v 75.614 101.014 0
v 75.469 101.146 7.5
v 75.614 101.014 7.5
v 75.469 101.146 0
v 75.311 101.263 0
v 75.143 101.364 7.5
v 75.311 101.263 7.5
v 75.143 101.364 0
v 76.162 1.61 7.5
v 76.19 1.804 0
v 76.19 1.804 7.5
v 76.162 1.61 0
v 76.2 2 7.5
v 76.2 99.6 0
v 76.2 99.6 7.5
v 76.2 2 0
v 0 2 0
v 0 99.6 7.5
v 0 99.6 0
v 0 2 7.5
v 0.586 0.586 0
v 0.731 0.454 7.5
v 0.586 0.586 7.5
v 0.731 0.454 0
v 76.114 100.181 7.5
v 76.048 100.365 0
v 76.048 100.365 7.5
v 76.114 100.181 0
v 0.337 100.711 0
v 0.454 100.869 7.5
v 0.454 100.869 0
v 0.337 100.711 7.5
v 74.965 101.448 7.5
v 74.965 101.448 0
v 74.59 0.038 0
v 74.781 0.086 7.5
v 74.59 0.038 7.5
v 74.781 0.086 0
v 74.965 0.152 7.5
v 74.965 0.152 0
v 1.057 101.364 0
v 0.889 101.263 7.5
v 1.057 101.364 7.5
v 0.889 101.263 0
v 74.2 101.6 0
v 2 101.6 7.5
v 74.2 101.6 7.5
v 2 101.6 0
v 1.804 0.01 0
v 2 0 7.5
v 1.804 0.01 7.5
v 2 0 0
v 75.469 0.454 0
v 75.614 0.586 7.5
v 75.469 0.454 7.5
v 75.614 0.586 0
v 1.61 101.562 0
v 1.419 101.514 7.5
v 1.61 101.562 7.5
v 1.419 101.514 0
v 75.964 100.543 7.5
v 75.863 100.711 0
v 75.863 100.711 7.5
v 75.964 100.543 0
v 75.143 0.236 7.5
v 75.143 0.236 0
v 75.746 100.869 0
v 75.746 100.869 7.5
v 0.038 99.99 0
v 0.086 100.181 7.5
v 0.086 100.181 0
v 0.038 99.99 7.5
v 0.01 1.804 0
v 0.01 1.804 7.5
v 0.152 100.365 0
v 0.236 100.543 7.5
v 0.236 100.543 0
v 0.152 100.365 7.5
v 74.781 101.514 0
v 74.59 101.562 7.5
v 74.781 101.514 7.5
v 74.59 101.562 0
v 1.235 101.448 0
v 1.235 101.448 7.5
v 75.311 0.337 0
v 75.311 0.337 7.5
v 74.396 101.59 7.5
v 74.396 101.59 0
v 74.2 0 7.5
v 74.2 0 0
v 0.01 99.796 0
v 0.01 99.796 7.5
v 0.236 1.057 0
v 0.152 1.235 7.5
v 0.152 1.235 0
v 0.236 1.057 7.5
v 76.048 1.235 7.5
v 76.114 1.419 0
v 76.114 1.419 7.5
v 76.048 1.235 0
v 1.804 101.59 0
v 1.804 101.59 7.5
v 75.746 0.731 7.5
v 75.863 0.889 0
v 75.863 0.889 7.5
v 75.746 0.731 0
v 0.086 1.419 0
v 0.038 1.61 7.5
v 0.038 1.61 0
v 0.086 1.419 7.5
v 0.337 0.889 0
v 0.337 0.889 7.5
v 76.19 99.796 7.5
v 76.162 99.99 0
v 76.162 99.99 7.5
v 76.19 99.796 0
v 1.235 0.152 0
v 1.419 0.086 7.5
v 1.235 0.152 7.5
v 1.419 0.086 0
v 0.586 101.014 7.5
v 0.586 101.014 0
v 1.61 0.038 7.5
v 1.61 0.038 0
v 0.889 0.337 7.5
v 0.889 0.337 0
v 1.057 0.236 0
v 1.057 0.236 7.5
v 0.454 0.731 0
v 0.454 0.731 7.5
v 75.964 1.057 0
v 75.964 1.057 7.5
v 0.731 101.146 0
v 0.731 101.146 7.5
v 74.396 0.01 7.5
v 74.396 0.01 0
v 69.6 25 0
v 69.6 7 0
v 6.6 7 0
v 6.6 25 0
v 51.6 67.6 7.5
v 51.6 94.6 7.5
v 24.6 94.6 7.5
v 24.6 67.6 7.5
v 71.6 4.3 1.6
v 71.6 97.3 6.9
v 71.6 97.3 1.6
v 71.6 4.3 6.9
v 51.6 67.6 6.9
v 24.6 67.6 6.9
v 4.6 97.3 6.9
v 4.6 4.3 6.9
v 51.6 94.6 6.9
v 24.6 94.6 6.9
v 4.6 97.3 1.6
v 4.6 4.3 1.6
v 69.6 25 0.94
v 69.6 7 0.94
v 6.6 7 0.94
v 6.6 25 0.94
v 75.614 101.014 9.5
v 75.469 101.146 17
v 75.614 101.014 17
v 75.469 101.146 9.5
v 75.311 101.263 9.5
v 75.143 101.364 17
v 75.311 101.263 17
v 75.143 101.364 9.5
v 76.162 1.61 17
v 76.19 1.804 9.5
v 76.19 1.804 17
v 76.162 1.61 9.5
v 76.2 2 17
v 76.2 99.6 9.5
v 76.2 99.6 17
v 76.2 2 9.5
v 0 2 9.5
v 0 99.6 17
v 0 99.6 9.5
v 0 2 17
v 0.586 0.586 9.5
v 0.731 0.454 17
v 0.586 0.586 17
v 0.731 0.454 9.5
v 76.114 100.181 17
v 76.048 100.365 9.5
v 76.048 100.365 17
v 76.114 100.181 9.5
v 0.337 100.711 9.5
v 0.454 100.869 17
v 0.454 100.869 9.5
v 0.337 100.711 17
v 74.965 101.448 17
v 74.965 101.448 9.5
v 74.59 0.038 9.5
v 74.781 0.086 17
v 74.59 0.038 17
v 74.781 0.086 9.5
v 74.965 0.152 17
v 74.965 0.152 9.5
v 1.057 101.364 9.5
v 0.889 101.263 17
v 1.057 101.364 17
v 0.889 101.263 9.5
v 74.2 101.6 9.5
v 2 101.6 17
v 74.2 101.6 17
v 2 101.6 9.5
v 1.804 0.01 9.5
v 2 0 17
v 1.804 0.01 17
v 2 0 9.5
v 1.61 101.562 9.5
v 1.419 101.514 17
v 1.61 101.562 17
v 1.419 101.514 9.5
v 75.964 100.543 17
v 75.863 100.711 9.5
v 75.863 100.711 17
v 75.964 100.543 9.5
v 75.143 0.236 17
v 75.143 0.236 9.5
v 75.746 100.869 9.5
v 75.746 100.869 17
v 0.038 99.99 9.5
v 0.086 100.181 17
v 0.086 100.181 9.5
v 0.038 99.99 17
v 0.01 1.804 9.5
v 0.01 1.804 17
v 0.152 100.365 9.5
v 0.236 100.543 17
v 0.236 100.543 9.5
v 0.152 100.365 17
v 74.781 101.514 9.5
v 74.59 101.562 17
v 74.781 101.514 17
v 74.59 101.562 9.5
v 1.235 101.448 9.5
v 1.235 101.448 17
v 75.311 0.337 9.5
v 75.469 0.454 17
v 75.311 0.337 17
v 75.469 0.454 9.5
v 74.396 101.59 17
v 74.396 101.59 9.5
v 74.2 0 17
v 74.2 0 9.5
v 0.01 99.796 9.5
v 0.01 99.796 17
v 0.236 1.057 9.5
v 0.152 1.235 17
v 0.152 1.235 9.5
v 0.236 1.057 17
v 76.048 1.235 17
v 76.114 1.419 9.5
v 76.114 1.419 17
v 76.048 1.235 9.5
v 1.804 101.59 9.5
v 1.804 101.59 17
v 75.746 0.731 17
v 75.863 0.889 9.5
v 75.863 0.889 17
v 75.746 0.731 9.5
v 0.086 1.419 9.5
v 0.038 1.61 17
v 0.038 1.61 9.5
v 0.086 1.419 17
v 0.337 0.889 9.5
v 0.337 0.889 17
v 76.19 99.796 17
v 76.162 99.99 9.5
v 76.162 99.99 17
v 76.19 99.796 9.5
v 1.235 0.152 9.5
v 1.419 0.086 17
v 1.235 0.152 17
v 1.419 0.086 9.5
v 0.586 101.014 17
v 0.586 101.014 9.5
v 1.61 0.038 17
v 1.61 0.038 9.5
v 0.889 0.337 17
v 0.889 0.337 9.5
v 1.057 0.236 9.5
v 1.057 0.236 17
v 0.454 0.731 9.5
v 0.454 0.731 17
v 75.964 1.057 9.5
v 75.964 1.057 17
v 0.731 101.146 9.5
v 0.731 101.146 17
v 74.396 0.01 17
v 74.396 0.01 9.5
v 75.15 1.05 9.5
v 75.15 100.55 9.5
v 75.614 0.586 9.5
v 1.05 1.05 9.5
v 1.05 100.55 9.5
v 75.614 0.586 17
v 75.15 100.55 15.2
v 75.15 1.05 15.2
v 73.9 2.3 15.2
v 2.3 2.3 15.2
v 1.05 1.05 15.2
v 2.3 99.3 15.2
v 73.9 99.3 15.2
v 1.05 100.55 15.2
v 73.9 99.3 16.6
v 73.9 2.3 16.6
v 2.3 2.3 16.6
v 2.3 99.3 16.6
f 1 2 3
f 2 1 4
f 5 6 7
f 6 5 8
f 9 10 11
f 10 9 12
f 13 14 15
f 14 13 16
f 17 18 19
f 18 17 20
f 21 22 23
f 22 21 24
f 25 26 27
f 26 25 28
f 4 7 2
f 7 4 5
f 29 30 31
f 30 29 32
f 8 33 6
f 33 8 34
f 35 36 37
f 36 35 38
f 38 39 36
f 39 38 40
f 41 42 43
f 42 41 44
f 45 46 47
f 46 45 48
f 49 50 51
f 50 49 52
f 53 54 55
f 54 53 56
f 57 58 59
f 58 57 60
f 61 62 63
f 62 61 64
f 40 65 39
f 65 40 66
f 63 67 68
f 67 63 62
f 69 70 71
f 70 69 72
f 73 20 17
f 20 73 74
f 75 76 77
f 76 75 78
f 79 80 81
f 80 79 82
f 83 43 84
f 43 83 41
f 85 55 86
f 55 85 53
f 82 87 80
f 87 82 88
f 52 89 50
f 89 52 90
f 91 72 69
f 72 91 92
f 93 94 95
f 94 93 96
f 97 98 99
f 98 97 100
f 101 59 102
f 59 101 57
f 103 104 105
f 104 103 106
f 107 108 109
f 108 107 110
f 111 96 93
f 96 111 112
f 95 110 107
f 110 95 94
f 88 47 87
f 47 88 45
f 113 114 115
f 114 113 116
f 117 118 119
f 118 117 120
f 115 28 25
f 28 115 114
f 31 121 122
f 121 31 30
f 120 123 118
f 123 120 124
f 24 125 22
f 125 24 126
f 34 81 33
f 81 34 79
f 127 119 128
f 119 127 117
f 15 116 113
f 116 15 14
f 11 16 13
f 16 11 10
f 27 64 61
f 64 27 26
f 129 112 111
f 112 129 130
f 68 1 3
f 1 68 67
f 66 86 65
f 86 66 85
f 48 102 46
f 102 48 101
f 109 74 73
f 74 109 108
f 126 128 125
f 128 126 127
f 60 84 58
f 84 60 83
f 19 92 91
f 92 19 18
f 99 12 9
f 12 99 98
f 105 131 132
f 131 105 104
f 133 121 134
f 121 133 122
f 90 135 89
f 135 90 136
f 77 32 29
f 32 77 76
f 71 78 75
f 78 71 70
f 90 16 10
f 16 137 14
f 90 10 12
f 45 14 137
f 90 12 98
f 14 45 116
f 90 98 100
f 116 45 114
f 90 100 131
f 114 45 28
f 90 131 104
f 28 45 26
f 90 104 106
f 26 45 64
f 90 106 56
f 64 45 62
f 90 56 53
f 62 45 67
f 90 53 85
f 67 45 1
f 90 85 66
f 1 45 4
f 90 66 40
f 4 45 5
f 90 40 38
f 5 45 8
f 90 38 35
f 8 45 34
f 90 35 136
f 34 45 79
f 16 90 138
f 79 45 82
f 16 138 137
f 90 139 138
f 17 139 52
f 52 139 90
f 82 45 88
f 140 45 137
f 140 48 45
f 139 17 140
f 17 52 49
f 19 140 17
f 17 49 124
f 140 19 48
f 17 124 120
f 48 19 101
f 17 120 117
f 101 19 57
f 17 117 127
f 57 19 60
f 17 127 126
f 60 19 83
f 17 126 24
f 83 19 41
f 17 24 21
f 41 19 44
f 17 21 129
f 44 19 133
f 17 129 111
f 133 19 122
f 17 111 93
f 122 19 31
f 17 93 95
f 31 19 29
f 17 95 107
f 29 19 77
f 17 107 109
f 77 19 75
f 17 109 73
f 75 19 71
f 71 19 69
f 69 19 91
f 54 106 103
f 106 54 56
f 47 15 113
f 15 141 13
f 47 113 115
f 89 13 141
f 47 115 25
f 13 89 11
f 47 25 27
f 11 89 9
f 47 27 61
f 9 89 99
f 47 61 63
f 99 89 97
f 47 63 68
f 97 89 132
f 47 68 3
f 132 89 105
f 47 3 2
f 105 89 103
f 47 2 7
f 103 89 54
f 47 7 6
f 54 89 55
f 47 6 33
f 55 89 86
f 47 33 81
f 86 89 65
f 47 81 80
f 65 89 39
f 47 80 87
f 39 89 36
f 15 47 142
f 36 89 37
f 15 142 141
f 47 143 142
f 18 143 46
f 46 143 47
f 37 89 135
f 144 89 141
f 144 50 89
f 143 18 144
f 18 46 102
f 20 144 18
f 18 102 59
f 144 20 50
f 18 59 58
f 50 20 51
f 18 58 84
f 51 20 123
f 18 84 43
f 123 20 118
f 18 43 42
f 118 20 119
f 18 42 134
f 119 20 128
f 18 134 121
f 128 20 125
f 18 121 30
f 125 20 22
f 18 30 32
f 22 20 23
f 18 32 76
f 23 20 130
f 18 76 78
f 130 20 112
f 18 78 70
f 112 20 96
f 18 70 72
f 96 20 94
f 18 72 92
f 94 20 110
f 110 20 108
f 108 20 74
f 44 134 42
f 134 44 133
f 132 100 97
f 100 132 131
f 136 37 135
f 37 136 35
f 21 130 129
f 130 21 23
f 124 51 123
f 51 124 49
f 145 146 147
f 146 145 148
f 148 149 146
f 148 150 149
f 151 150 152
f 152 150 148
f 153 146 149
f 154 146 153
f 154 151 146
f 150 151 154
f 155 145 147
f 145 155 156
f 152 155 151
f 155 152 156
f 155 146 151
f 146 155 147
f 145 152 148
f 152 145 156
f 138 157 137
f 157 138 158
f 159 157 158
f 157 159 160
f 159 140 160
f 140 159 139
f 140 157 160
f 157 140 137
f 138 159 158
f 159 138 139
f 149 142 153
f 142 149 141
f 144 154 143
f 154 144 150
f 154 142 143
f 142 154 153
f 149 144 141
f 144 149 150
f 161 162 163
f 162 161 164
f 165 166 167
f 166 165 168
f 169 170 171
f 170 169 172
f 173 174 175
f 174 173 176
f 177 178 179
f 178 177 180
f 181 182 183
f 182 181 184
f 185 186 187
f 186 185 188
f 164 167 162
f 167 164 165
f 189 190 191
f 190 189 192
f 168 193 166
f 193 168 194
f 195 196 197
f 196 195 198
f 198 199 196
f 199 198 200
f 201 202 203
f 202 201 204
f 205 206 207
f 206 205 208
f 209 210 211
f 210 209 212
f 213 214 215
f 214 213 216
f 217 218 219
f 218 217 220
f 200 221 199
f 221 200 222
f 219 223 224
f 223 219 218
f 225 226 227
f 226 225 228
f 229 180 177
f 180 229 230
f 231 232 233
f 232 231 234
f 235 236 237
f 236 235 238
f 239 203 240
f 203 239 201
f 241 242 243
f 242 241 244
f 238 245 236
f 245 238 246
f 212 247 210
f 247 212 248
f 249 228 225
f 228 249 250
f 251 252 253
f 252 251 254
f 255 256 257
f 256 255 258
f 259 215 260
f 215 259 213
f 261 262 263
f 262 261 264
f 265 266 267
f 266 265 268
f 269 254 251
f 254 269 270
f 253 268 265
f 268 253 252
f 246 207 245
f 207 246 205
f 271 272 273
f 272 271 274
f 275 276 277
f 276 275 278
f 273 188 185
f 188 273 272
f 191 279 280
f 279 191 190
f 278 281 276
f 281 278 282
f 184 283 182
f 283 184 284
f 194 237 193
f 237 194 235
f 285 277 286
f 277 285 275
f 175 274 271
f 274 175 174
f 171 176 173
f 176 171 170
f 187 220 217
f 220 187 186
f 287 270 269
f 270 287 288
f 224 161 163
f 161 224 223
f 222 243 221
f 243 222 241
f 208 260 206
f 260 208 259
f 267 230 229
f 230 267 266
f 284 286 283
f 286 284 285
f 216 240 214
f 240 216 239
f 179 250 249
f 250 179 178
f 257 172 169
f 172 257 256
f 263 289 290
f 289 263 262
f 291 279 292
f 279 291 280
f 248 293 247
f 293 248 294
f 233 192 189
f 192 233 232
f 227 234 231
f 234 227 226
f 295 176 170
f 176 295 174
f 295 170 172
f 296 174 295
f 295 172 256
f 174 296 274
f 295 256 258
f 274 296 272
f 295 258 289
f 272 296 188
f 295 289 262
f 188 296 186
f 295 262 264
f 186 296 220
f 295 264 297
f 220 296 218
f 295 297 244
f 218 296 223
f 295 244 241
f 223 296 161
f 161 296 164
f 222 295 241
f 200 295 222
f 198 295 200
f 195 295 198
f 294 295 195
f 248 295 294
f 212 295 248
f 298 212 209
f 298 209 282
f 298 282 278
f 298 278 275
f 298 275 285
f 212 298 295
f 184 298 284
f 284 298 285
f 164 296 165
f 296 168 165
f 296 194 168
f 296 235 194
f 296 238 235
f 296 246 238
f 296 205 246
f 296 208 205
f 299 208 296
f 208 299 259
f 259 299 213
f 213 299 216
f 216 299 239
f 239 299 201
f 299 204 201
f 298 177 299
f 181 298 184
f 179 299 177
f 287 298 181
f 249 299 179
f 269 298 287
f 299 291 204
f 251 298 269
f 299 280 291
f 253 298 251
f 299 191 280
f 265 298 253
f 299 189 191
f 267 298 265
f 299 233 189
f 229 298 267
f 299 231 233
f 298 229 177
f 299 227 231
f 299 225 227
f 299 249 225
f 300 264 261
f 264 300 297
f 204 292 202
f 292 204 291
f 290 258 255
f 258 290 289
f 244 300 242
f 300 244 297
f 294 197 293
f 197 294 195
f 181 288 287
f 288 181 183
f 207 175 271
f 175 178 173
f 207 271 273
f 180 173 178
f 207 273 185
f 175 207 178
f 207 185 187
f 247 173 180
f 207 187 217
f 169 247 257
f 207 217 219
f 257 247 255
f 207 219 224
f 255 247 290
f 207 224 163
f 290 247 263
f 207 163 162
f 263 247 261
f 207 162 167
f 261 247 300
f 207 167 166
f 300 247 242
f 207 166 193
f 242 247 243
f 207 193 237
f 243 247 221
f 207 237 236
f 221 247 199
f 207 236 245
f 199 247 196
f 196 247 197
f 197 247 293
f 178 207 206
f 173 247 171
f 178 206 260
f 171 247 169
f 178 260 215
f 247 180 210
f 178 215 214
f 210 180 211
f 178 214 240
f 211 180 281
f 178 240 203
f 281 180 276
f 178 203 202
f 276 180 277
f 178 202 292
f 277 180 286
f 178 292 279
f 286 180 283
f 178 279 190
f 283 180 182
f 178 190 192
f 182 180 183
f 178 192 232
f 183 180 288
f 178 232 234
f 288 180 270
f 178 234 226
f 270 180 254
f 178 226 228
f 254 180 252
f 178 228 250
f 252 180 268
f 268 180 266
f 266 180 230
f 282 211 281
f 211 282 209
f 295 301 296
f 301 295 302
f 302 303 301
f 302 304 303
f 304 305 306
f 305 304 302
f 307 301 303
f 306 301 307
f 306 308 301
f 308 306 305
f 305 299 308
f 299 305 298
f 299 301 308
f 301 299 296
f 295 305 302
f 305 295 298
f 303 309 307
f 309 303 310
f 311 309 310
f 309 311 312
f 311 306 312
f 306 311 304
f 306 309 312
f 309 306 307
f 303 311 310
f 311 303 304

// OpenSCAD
// =============================================
// HoloCase V5 - Slimmer + Premium Look
// =============================================

/* [Render Mode] */
// "base", "lid", or "both"
render_what = "both";

/* [Main Size] */
width      = 76.2;
height     = 101.6;
thickness  = 7.5;        // Slightly slimmer overall

/* [Card Cavity] */
card_width     = 66.0;
card_height    = 92.0;
card_thickness = 2.3;
clearance      = 0.5;

/* [Lid Design] */
lid_overlap    = 5.2;
wall           = 1.6;     // Main wall thickness
side_wall      = 1.4;     // Slightly thinner on sides for slim profile

/* [Features] */
label_depth = 0.85;
qr_size     = 27;
qr_depth    = 0.85;

/* [Rounding] */
corner_r = 2.0;

module rounded_box(w, h, t, r) {
    hull() {
        translate([r, r, 0]) cylinder(r=r, h=t, $fn=64);
        translate([w-r, r, 0]) cylinder(r=r, h=t, $fn=64);
        translate([r, h-r, 0]) cylinder(r=r, h=t, $fn=64);
        translate([w-r, h-r, 0]) cylinder(r=r, h=t, $fn=64);
    }
}

module base() {
    difference() {
        rounded_box(width, height, thickness, corner_r);
        
        // Card cavity
        translate([
            (width - card_width - clearance*2)/2,
            (height - card_height - clearance*2)/2,
            wall
        ])
        cube([card_width + clearance*2, card_height + clearance*2, card_thickness + 3]);
        
        // Label recess (front)
        translate([wall + 5, 7, -0.01])
        cube([width - wall*2 - 10, 18, label_depth + 0.1]);
        
        // QR recess (back)
        translate([(width - qr_size)/2, height - qr_size - 7, thickness - qr_depth])
        cube([qr_size, qr_size, qr_depth + 0.1]);
    }
}

module lid() {
    difference() {
        rounded_box(width, height, thickness, corner_r);
        
        // Main overlap cavity
        translate([side_wall - 0.35, side_wall - 0.35, -0.1])
        cube([
            width - side_wall*2 + 0.7,
            height - side_wall*2 + 0.7,
            lid_overlap + 0.6
        ]);
        
        // Internal seating ledge
        translate([side_wall + 0.9, side_wall + 0.9, lid_overlap - 1.6])
        cube([
            width - side_wall*2 - 1.8,
            height - side_wall*2 - 1.8,
            3.5
        ]);
    }
}

// Render
if (render_what == "base" || render_what == "both") {
    color("Gold") base();
}

if (render_what == "lid" || render_what == "both") {
    translate([0, 0, thickness + 2])
    color("DeepSkyBlue") lid();
}
